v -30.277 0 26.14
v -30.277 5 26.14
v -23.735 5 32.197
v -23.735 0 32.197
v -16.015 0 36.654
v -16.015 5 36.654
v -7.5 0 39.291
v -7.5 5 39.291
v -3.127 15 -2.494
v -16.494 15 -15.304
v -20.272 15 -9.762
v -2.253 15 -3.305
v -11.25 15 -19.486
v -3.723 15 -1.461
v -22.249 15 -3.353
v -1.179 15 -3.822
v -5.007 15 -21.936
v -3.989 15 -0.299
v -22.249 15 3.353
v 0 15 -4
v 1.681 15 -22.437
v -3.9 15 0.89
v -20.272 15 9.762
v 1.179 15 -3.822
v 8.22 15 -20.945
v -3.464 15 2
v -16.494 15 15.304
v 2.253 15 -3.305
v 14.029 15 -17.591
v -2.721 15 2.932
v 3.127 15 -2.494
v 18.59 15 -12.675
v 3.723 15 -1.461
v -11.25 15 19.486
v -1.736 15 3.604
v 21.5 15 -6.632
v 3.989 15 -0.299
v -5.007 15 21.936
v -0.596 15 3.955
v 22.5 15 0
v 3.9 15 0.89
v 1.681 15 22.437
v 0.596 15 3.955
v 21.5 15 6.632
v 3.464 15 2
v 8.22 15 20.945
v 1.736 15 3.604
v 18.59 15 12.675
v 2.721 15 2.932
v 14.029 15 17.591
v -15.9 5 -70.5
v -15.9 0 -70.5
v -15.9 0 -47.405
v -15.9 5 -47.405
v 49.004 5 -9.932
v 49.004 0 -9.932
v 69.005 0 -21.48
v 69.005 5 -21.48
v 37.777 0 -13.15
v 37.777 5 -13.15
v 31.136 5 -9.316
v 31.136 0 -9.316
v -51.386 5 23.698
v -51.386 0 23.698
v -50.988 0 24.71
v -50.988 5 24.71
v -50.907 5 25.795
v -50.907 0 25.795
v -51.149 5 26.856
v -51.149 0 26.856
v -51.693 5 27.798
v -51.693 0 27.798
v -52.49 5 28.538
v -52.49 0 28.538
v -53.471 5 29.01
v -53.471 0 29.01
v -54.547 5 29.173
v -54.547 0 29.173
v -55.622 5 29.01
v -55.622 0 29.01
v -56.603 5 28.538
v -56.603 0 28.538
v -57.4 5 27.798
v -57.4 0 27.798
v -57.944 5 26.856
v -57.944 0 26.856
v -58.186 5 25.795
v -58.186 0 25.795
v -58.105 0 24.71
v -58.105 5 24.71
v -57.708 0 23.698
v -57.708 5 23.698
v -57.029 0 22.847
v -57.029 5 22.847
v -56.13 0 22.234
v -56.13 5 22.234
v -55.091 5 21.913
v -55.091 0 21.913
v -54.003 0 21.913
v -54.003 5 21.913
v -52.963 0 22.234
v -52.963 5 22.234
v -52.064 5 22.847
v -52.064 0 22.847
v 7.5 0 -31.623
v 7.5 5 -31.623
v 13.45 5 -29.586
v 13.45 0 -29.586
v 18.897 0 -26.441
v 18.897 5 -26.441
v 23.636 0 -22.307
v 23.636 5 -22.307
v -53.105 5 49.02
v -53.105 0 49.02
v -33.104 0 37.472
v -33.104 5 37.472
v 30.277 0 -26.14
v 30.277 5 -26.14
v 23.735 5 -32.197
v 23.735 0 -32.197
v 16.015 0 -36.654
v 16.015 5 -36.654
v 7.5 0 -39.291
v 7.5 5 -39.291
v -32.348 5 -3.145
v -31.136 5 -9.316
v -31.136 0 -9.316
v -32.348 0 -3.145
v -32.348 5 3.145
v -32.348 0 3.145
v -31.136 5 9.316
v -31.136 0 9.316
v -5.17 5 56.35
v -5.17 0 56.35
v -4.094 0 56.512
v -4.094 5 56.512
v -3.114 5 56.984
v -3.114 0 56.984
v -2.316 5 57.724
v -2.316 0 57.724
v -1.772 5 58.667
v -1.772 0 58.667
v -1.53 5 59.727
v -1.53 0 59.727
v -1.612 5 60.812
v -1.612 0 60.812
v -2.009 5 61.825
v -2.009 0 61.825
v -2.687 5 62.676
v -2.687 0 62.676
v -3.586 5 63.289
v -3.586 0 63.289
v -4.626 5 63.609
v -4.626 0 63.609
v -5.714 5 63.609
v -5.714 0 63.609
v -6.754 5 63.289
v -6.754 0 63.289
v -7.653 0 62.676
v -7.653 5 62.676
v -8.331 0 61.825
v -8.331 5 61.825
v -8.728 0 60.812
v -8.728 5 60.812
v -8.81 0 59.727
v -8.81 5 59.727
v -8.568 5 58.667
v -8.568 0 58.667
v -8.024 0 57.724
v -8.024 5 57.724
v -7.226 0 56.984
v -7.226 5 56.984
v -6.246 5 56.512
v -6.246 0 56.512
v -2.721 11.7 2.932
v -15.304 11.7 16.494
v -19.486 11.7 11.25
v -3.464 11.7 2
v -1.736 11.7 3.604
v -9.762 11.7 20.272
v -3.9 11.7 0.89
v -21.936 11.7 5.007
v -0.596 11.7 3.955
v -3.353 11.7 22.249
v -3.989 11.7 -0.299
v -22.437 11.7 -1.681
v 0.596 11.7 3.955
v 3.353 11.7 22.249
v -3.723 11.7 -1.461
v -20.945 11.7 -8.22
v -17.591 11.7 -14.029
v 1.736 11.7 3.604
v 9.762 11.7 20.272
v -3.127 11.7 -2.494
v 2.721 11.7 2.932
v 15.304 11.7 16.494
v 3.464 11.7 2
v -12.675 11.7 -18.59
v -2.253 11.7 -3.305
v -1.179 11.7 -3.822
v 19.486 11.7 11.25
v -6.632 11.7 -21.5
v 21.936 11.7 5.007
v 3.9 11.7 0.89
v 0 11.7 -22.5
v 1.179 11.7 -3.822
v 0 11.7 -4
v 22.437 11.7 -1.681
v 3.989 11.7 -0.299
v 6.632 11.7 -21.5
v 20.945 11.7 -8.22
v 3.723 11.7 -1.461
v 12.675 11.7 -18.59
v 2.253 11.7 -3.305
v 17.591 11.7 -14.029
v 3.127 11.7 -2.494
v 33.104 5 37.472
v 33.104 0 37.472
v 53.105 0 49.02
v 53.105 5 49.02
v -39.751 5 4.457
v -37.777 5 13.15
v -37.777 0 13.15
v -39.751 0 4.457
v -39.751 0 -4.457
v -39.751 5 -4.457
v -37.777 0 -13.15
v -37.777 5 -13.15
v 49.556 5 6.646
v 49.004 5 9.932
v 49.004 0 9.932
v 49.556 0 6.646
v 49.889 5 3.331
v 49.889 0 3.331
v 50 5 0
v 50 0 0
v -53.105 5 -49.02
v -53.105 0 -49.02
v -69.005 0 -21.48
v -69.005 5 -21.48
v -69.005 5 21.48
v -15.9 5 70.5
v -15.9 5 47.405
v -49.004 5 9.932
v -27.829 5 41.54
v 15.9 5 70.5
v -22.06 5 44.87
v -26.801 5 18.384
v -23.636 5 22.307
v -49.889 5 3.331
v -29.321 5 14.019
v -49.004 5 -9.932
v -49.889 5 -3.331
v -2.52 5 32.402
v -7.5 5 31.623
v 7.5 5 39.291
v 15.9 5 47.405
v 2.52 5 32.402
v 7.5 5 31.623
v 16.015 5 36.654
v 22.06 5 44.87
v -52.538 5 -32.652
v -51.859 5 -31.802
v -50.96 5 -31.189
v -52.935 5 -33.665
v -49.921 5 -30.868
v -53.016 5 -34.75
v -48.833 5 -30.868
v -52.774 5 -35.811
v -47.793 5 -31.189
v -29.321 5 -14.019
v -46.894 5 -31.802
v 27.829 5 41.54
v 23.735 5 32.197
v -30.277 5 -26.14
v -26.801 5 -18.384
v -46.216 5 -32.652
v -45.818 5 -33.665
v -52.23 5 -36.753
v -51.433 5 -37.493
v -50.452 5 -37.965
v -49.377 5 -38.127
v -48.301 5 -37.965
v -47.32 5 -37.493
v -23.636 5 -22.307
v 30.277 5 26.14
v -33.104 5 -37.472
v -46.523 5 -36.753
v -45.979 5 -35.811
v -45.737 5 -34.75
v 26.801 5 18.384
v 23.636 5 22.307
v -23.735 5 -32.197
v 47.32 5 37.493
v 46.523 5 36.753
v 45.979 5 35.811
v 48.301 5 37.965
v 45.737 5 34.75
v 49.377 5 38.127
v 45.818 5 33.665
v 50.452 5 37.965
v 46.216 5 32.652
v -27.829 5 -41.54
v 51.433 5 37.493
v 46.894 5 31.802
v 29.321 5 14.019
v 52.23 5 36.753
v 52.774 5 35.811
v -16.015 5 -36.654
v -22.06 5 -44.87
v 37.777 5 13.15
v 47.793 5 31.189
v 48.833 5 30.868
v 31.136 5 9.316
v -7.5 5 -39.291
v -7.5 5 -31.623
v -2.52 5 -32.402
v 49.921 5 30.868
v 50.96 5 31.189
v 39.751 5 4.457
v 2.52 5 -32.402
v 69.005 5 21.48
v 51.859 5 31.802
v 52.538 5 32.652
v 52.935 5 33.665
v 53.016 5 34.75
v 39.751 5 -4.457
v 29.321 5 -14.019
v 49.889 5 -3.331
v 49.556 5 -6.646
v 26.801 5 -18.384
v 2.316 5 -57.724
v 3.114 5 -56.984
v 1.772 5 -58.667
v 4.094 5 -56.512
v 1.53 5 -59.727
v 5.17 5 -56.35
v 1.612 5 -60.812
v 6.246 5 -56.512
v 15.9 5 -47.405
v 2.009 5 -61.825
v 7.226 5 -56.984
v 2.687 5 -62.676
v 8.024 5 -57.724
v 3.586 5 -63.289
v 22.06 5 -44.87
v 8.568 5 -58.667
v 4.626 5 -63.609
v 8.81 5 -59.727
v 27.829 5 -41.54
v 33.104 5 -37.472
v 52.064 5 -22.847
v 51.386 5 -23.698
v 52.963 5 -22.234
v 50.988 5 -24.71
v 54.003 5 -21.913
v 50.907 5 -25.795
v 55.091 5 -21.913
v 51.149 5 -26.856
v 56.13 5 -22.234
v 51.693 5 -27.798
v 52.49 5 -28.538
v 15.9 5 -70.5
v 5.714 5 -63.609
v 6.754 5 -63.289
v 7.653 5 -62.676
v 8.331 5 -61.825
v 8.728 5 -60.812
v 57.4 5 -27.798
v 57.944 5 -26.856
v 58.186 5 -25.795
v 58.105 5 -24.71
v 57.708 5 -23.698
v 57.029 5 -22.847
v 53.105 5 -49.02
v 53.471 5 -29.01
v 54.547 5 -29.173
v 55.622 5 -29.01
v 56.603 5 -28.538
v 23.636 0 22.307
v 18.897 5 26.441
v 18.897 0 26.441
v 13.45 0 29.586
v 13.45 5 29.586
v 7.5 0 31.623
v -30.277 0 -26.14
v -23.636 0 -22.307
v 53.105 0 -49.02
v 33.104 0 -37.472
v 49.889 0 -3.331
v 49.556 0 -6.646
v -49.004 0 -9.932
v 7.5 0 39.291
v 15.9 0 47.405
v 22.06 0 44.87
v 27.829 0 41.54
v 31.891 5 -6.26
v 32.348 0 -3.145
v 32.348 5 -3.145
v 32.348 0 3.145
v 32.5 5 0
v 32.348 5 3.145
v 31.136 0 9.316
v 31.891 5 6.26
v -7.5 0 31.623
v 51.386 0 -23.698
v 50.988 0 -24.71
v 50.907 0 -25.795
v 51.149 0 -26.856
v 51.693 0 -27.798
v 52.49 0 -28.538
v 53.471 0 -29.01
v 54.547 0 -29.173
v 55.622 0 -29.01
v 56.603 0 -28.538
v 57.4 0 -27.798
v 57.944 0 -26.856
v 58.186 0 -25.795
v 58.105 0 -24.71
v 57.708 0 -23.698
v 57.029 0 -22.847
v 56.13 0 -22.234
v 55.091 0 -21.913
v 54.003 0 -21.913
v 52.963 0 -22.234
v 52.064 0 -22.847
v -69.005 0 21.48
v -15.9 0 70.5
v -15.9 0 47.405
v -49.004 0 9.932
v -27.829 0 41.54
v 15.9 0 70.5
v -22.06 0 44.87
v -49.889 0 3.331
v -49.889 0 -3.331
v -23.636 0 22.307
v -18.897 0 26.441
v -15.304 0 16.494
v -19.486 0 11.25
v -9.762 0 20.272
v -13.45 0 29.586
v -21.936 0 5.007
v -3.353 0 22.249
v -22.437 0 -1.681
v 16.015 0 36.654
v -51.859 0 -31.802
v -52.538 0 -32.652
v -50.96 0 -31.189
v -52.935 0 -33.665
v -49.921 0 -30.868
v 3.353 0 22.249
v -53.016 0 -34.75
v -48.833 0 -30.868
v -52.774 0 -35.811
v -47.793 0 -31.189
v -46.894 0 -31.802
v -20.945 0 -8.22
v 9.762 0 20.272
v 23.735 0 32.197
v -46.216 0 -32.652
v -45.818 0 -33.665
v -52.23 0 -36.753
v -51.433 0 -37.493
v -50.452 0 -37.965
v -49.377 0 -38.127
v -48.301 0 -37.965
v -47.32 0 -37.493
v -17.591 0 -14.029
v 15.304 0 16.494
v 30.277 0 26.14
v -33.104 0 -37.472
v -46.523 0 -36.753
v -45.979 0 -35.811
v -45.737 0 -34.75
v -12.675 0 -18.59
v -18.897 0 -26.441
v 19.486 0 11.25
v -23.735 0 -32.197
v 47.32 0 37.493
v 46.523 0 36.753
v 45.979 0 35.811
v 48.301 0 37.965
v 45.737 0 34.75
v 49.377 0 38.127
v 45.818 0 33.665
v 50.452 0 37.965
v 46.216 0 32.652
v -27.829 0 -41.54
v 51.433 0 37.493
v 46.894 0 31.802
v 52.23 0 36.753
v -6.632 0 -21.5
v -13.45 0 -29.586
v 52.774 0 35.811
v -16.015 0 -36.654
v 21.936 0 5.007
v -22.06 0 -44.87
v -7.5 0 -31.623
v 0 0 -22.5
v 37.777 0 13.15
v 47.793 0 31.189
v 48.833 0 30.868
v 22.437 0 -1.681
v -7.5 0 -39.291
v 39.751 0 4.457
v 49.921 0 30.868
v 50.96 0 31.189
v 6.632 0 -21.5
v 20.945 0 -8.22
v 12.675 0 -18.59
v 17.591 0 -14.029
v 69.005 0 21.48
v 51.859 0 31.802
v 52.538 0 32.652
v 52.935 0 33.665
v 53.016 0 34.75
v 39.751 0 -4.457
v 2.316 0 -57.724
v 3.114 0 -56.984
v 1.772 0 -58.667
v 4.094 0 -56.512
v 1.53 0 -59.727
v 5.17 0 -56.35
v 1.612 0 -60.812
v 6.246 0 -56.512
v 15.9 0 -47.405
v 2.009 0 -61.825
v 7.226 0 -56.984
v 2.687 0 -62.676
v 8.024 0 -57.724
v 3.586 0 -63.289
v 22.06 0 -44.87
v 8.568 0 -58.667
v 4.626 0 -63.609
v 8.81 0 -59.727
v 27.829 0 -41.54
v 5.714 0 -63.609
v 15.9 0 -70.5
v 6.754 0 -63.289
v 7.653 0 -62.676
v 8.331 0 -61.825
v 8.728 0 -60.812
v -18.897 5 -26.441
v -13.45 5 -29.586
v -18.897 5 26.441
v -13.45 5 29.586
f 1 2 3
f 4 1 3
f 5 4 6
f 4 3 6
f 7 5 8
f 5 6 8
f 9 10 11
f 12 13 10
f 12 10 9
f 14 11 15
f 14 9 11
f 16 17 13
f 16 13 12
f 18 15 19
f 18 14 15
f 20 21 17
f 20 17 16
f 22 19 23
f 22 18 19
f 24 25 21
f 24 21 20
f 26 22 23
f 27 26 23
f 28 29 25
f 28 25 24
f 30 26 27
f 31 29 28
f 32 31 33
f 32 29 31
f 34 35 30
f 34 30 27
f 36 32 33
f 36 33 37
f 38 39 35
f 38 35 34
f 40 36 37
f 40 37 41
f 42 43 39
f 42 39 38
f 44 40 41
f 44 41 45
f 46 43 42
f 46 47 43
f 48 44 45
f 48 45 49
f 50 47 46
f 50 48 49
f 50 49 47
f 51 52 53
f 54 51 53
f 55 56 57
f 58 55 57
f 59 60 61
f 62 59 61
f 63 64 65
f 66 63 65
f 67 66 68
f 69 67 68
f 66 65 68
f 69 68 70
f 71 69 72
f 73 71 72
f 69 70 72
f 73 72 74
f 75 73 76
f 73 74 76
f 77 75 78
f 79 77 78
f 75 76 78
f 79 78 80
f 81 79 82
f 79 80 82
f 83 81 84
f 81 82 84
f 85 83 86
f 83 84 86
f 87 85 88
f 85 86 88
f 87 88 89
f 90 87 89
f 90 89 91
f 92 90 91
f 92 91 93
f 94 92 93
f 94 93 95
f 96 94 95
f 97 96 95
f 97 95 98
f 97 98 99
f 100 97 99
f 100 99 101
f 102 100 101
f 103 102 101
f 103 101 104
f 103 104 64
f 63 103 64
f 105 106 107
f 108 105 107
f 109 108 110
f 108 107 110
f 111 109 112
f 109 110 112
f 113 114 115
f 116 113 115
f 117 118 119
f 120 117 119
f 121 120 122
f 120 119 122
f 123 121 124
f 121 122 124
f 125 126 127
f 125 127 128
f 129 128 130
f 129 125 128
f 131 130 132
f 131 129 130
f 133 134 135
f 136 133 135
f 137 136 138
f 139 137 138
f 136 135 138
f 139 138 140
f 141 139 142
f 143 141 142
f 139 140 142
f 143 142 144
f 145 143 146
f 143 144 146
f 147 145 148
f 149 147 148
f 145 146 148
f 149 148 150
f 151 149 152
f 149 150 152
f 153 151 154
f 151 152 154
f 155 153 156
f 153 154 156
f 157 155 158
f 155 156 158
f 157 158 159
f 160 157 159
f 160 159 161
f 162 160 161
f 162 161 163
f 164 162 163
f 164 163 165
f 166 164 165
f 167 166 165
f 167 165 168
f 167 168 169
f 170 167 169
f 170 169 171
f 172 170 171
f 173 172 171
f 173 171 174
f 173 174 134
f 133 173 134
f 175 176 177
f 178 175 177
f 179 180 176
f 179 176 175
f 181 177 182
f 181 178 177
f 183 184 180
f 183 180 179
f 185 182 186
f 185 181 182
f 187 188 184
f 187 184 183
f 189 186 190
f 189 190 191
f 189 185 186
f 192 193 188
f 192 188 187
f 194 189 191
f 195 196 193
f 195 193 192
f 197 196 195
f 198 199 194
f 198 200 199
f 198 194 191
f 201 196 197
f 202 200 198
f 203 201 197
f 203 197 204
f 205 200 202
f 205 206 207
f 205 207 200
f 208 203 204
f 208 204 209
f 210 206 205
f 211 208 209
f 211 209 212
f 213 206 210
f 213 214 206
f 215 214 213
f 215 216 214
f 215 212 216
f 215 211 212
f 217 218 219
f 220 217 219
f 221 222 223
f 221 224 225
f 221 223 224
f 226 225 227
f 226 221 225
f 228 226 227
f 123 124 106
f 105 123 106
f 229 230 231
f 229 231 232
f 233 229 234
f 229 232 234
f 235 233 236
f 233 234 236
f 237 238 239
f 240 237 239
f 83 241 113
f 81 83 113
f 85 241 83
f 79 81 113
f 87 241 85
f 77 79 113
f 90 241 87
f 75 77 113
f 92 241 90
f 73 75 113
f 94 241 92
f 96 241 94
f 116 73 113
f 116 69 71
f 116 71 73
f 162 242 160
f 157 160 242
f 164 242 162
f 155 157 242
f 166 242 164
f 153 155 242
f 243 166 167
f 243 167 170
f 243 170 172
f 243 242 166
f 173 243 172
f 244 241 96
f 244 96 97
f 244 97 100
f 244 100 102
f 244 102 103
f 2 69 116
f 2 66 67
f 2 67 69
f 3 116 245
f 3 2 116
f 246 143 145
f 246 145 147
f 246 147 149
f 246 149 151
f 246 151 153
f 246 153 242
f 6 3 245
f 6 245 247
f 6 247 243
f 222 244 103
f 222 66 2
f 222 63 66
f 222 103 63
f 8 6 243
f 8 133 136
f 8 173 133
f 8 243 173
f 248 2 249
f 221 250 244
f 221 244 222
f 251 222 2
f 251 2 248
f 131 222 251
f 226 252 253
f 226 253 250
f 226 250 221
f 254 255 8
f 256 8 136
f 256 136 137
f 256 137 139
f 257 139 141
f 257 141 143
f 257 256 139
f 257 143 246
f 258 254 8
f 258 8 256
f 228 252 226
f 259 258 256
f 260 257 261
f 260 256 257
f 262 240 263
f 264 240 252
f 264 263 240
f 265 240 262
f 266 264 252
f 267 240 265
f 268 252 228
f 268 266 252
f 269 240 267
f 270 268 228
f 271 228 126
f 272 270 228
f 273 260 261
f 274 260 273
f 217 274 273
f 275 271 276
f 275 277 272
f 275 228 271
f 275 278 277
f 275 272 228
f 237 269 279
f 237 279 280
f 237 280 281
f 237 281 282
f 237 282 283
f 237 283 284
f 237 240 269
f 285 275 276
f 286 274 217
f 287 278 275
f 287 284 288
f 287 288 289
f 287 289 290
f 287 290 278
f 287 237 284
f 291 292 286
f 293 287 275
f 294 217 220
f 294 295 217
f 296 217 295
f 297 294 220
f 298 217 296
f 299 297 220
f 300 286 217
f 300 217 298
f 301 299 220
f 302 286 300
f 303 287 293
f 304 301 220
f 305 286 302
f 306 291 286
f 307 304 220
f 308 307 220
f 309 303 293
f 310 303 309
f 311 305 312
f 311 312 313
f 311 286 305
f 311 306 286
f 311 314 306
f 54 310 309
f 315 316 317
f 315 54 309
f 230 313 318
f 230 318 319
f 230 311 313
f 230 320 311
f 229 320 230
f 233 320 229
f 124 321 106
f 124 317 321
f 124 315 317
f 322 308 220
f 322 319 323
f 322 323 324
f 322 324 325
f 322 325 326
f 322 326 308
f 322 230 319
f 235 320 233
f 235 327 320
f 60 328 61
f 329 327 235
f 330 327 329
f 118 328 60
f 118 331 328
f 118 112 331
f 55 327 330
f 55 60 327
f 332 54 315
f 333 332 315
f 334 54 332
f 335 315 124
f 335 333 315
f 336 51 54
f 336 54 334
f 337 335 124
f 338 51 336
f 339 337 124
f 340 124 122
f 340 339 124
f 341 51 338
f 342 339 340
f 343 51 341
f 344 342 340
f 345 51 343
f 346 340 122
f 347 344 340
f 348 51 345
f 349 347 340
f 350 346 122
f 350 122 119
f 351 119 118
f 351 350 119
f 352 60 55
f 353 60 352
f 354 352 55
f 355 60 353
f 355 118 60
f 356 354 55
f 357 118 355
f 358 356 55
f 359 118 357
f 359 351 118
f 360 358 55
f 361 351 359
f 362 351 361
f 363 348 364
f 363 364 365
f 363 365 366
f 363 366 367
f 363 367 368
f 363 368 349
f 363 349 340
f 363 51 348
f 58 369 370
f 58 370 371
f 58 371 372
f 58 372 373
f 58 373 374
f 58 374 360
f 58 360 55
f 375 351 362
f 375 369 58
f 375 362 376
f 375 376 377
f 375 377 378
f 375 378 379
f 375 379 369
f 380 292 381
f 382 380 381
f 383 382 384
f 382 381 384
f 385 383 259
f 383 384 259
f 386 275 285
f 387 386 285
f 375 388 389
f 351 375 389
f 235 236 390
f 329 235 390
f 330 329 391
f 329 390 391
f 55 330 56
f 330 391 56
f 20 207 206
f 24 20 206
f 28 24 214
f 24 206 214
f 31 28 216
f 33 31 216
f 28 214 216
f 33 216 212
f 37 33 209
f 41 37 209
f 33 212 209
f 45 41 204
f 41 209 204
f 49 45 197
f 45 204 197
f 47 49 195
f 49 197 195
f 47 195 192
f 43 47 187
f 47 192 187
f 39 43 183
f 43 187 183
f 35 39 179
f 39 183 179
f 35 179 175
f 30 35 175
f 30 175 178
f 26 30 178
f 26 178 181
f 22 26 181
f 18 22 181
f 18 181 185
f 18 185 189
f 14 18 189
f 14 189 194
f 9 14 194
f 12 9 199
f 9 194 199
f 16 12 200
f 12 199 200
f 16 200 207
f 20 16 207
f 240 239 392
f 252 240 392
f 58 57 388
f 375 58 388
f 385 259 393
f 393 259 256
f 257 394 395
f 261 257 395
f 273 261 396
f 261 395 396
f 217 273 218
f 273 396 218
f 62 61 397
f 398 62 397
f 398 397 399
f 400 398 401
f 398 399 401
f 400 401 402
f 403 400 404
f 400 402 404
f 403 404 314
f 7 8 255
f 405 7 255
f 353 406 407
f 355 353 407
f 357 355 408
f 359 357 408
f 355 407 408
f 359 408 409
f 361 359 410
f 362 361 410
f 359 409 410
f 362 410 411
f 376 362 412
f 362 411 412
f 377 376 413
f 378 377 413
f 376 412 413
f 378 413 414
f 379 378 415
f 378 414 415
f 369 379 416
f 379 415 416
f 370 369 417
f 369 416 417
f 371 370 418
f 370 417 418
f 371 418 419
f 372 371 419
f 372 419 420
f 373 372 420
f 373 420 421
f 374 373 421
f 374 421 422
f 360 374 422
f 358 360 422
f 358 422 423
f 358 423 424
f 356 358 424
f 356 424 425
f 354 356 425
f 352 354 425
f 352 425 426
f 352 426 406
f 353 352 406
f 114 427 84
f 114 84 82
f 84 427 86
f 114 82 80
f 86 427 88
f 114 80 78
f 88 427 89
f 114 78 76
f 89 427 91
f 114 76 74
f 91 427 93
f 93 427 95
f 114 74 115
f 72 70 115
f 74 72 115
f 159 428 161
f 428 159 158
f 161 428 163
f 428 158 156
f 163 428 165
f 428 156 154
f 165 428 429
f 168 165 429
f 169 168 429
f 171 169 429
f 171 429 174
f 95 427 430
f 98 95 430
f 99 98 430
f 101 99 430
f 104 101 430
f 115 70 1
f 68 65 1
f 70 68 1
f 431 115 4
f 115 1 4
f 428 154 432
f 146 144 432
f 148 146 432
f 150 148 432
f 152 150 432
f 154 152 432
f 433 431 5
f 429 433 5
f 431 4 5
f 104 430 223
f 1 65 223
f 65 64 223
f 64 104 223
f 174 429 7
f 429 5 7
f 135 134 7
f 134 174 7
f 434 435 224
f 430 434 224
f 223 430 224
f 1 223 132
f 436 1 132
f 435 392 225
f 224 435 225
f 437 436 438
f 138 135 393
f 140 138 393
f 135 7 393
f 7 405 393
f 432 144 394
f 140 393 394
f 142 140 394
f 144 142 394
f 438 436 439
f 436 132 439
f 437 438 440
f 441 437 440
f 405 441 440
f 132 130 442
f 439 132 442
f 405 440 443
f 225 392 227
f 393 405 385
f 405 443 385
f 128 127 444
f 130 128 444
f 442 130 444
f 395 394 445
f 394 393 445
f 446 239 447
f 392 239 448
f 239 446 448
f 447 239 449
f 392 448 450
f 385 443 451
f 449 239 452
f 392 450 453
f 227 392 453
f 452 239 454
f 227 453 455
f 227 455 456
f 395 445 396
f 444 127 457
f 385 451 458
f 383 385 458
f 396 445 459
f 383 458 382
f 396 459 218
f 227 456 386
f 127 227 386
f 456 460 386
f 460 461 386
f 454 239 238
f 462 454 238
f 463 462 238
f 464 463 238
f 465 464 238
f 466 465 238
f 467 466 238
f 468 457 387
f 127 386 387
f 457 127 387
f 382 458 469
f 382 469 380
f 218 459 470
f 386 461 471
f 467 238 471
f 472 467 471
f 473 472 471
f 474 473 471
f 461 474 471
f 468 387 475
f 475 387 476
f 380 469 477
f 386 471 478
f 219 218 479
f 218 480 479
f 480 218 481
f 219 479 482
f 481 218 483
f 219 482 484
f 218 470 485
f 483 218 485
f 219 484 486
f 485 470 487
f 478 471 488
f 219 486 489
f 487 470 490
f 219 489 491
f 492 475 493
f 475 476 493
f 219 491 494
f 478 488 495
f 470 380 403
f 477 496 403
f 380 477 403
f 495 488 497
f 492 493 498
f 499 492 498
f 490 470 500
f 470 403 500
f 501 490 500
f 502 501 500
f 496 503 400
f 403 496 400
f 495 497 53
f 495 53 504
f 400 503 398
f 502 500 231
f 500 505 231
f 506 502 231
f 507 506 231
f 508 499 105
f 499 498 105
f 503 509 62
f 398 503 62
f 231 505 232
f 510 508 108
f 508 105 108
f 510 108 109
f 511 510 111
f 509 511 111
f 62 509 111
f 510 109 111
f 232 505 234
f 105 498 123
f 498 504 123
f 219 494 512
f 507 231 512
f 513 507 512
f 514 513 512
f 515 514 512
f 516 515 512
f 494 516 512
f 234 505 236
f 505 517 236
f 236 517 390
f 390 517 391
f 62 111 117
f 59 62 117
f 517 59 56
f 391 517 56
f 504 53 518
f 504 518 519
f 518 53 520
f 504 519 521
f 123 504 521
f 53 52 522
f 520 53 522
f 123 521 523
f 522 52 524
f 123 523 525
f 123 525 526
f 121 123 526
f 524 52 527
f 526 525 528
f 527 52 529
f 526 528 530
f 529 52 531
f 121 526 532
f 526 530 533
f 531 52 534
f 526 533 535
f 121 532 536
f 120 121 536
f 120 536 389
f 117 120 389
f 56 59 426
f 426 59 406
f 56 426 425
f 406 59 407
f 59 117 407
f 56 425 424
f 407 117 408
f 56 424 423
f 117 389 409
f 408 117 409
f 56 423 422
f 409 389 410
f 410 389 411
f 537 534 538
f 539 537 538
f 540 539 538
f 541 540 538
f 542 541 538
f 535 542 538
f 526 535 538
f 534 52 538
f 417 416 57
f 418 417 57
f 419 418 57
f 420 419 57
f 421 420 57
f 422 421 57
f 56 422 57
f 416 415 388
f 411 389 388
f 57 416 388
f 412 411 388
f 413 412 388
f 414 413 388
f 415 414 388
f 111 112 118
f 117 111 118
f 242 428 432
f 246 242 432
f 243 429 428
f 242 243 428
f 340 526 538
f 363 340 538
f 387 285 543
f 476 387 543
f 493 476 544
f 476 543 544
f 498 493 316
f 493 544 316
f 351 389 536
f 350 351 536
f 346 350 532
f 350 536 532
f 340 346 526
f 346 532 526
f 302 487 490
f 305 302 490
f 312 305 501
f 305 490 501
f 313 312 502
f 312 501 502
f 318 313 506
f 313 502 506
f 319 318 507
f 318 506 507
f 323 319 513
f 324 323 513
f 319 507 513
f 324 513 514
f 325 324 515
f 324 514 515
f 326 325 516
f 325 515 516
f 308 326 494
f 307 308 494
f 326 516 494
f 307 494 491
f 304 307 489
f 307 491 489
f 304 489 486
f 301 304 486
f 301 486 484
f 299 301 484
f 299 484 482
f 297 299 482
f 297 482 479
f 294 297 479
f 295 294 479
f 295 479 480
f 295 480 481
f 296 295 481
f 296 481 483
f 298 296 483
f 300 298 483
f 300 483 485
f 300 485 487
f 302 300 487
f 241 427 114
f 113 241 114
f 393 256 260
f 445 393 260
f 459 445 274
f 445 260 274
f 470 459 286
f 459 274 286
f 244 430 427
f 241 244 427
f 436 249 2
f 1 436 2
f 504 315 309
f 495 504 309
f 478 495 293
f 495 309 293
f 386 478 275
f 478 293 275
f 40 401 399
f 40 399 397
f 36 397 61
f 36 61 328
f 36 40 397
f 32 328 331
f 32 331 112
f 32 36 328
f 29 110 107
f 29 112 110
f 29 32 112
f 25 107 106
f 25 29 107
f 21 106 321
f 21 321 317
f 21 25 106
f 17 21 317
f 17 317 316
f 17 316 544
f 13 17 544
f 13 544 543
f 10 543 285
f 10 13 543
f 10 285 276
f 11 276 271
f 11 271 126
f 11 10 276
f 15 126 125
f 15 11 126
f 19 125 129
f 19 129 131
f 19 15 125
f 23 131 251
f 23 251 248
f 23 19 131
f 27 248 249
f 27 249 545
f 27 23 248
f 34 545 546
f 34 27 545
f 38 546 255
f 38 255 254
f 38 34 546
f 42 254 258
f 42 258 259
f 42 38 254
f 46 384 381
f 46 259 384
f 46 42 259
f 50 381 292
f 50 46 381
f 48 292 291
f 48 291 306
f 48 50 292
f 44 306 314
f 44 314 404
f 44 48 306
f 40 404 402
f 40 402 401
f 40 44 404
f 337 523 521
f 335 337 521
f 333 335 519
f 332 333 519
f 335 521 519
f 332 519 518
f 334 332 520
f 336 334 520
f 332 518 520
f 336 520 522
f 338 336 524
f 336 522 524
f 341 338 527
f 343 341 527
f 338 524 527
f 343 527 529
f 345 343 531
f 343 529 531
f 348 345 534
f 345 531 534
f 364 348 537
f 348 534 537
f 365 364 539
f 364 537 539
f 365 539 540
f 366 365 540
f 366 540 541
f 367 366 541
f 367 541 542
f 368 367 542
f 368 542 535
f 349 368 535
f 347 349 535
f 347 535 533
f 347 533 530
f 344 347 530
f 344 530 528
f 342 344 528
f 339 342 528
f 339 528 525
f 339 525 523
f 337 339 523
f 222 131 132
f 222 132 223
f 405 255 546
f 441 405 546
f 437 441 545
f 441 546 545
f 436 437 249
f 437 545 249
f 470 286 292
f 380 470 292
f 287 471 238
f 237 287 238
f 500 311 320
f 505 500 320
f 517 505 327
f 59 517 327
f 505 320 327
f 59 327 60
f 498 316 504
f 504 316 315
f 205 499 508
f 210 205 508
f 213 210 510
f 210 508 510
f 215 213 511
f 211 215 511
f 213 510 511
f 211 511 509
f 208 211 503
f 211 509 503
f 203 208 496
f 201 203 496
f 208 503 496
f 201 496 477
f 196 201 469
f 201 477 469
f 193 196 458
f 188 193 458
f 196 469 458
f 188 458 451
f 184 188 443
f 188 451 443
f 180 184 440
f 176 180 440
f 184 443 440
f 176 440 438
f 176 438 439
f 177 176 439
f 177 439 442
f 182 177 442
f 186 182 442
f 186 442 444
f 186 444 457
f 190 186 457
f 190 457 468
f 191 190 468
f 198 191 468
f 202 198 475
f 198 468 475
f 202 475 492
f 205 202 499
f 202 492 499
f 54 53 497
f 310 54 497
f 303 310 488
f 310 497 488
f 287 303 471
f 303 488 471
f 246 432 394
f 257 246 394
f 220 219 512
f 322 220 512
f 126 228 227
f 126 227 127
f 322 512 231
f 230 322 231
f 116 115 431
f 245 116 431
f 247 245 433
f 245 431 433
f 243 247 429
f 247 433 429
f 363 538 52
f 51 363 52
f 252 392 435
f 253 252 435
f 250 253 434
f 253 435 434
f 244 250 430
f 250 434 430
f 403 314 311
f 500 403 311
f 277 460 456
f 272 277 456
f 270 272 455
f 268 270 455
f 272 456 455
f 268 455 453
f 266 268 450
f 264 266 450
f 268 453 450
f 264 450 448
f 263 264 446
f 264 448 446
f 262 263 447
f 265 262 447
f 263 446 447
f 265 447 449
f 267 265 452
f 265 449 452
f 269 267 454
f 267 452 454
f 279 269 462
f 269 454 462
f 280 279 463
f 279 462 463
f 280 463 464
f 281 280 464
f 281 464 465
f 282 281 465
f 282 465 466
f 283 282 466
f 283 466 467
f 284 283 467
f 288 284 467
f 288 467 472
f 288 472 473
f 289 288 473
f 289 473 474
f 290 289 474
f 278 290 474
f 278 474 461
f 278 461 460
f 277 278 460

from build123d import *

# Parameters (mm, degrees)
BOSS_EXTRUDE1_DEPTH = 5
CIRPATTERN1_COUNT   = 3
CIRPATTERN1_ANGLE   = 120
SKETCH8_R           = 22.5
BOSS_EXTRUDE4_DEPTH = 10
SKETCH11_R          = 22.5
CUT_EXTRUDE4_DEPTH  = 11.7
SKETCH12_R          = 4
CUT_EXTRUDE5_DEPTH  = 3.3
SKETCH14_R          = 3.65
CUT_EXTRUDE7_DEPTH  = 100.784323589
CIRPATTERN2_COUNT   = 6
CUT_EXTRUDE9_DEPTH  = 15


# Read off the part's stored shape, not the designer's step: Boundary2
with BuildPart() as part:
    # Sketch1 → Boss-Extrude1 (new body)
    with BuildSketch(Plane(origin=(0, 0, 0), x_dir=(1, 0, 0), z_dir=(0, 1, 0))):
        with BuildLine():
            ThreePointArc((-15.9, 47.404535648), (-50, 0), (-15.9, -47.404535648))
            Line((-15.9, -47.404535648), (-15.9, 47.404535648))
        make_face()
        with BuildLine():
            ThreePointArc((-15.9, -47.404535648), (0, -50), (15.9, -47.404535648))
            Line((15.9, -47.404535648), (15.9, 47.404535648))
            ThreePointArc((15.9, 47.404535648), (0, 50), (-15.9, 47.404535648))
            Line((-15.9, 47.404535648), (-15.9, -47.404535648))
        make_face()
        with BuildLine():
            Line((-15.9, -70.5), (15.9, -70.5))
            Line((15.9, -70.5), (15.9, -47.404535648))
            ThreePointArc((15.9, -47.404535648), (0, -50), (-15.9, -47.404535648))
            Line((-15.9, -47.404535648), (-15.9, -70.5))
        make_face()
        with BuildLine():
            ThreePointArc((-15.9, 47.404535648), (0, 50), (15.9, 47.404535648))
            Line((15.9, 47.404535648), (15.9, 70.5))
            Line((15.9, 70.5), (-15.9, 70.5))
            Line((-15.9, 70.5), (-15.9, 47.404535648))
        make_face()
        with BuildLine():
            Line((15.9, 47.404535648), (15.9, -47.404535648))
            ThreePointArc((15.9, -47.404535648), (40.589407485, -29.197602641), (50, 0))
            ThreePointArc((50, 0), (40.589407485, 29.197602641), (15.9, 47.404535648))
        make_face()
    boss_extrude1 = extrude(amount=BOSS_EXTRUDE1_DEPTH)

    # CirPattern1: Boss-Extrude1 ×3 about axis
    cirpattern1_axis = Axis((0, 0, 0), (0, 1, 0))
    for i in range(1, CIRPATTERN1_COUNT):
        add(boss_extrude1.rotate(cirpattern1_axis, i * CIRPATTERN1_ANGLE / (CIRPATTERN1_COUNT - 1)))

    # Sketch8 → Boss-Extrude4 (add)
    with BuildSketch(Plane(origin=(0, 5, 0), x_dir=(1, 0, 0), z_dir=(0, 1, 0))):
        with Locations(Location((0, 0, 0), (0, 0, 270))):
            Circle(SKETCH8_R)
    extrude(amount=BOSS_EXTRUDE4_DEPTH)

    # Boundary2 outline → Boundary2 (revolve)
    with BuildSketch(Plane.XY):
        Polygon((32.5, 5), (22.499998072, 15.000001928), (22.5, 5), align=None)
    revolve(axis=Axis((0, 0, 0), (0, 1, 0)))

    # Sketch11 → Cut-Extrude4 (cut)
    with BuildSketch(Plane.XZ):
        with Locations(Location((0, 0, 0), (0, 0, 270))):
            Circle(SKETCH11_R)
    extrude(amount=-CUT_EXTRUDE4_DEPTH, mode=Mode.SUBTRACT)

    # Sketch12 → Cut-Extrude5 (cut)
    with BuildSketch(Plane.XZ.offset(-11.7)):
        with Locations(Location((0, 0, 0), (0, 0, 270))):
            Circle(SKETCH12_R)
    extrude(amount=-CUT_EXTRUDE5_DEPTH, mode=Mode.SUBTRACT)

    # Sketch14 → Cut-Extrude7 (cut, through all)
    with BuildSketch(Plane(origin=(0, 0, 0), x_dir=(-1, 0, 0), z_dir=(0, -1, 0))):
        with Locations(Location((5.17, -60, 0), (0, 0, 90))):
            Circle(SKETCH14_R)
    cut_extrude7 = extrude(amount=-CUT_EXTRUDE7_DEPTH, mode=Mode.SUBTRACT)

    # CirPattern2: Cut-Extrude7 ×6 about axis
    cirpattern2_axis = Axis((0, 0, 0), (0, 1, 0))
    for i in range(1, CIRPATTERN2_COUNT):
        add(cut_extrude7.rotate(cirpattern2_axis, i * 360 / CIRPATTERN2_COUNT), mode=Mode.SUBTRACT)

    # Sketch15 → Cut-Extrude9 (cut)
    with BuildSketch(Plane(origin=(0, 5, 0), x_dir=(1, 0, 0), z_dir=(0, 1, 0))):
        with BuildLine():
            Line((-37.776643972, 13.150101528), (-31.136127875, 9.316197772))
            ThreePointArc((-31.136127875, 9.316197772), (-32.5, 0), (-31.136127875, -9.316197772))
            Line((-31.136127875, -9.316197772), (-37.776643972, -13.150101528))
            ThreePointArc((-37.776643972, -13.150101528), (-40, 0), (-37.776643972, 13.150101528))
        make_face()
        with BuildLine():
            Line((-30.276643972, 26.140482585), (-23.636127875, 22.306578829))
            ThreePointArc((-23.636127875, 22.306578829), (-16.25, 28.145825623), (-7.5, 31.622776602))
            Line((-7.5, 31.622776602), (-7.5, 39.290584114))
            ThreePointArc((-7.5, 39.290584114), (-20, 34.641016151), (-30.276643972, 26.140482585))
        make_face()
        with BuildLine():
            Line((7.5, 39.290584114), (7.5, 31.622776602))
            ThreePointArc((7.5, 31.622776602), (16.25, 28.145825623), (23.636127875, 22.306578829))
            Line((23.636127875, 22.306578829), (30.276643972, 26.140482585))
            ThreePointArc((30.276643972, 26.140482585), (20, 34.641016151), (7.5, 39.290584114))
        make_face()
        with BuildLine():
            Line((37.776643972, 13.150101528), (31.136127875, 9.316197772))
            ThreePointArc((31.136127875, 9.316197772), (32.5, 0), (31.136127875, -9.316197772))
            Line((31.136127875, -9.316197772), (37.776643972, -13.150101528))
            ThreePointArc((37.776643972, -13.150101528), (40, 0), (37.776643972, 13.150101528))
        make_face()
        with BuildLine():
            Line((30.276643972, -26.140482585), (23.636127875, -22.306578829))
            ThreePointArc((23.636127875, -22.306578829), (16.25, -28.145825623), (7.5, -31.622776602))
            Line((7.5, -31.622776602), (7.5, -39.290584114))
            ThreePointArc((7.5, -39.290584114), (20, -34.641016151), (30.276643972, -26.140482585))
        make_face()
        with BuildLine():
            Line((-7.5, -39.290584114), (-7.5, -31.622776602))
            ThreePointArc((-7.5, -31.622776602), (-16.25, -28.145825623), (-23.636127875, -22.306578829))
            Line((-23.636127875, -22.306578829), (-30.276643972, -26.140482585))
            ThreePointArc((-30.276643972, -26.140482585), (-20, -34.641016151), (-7.5, -39.290584114))
        make_face()
    extrude(amount=-CUT_EXTRUDE9_DEPTH, mode=Mode.SUBTRACT)


solid = part.part
